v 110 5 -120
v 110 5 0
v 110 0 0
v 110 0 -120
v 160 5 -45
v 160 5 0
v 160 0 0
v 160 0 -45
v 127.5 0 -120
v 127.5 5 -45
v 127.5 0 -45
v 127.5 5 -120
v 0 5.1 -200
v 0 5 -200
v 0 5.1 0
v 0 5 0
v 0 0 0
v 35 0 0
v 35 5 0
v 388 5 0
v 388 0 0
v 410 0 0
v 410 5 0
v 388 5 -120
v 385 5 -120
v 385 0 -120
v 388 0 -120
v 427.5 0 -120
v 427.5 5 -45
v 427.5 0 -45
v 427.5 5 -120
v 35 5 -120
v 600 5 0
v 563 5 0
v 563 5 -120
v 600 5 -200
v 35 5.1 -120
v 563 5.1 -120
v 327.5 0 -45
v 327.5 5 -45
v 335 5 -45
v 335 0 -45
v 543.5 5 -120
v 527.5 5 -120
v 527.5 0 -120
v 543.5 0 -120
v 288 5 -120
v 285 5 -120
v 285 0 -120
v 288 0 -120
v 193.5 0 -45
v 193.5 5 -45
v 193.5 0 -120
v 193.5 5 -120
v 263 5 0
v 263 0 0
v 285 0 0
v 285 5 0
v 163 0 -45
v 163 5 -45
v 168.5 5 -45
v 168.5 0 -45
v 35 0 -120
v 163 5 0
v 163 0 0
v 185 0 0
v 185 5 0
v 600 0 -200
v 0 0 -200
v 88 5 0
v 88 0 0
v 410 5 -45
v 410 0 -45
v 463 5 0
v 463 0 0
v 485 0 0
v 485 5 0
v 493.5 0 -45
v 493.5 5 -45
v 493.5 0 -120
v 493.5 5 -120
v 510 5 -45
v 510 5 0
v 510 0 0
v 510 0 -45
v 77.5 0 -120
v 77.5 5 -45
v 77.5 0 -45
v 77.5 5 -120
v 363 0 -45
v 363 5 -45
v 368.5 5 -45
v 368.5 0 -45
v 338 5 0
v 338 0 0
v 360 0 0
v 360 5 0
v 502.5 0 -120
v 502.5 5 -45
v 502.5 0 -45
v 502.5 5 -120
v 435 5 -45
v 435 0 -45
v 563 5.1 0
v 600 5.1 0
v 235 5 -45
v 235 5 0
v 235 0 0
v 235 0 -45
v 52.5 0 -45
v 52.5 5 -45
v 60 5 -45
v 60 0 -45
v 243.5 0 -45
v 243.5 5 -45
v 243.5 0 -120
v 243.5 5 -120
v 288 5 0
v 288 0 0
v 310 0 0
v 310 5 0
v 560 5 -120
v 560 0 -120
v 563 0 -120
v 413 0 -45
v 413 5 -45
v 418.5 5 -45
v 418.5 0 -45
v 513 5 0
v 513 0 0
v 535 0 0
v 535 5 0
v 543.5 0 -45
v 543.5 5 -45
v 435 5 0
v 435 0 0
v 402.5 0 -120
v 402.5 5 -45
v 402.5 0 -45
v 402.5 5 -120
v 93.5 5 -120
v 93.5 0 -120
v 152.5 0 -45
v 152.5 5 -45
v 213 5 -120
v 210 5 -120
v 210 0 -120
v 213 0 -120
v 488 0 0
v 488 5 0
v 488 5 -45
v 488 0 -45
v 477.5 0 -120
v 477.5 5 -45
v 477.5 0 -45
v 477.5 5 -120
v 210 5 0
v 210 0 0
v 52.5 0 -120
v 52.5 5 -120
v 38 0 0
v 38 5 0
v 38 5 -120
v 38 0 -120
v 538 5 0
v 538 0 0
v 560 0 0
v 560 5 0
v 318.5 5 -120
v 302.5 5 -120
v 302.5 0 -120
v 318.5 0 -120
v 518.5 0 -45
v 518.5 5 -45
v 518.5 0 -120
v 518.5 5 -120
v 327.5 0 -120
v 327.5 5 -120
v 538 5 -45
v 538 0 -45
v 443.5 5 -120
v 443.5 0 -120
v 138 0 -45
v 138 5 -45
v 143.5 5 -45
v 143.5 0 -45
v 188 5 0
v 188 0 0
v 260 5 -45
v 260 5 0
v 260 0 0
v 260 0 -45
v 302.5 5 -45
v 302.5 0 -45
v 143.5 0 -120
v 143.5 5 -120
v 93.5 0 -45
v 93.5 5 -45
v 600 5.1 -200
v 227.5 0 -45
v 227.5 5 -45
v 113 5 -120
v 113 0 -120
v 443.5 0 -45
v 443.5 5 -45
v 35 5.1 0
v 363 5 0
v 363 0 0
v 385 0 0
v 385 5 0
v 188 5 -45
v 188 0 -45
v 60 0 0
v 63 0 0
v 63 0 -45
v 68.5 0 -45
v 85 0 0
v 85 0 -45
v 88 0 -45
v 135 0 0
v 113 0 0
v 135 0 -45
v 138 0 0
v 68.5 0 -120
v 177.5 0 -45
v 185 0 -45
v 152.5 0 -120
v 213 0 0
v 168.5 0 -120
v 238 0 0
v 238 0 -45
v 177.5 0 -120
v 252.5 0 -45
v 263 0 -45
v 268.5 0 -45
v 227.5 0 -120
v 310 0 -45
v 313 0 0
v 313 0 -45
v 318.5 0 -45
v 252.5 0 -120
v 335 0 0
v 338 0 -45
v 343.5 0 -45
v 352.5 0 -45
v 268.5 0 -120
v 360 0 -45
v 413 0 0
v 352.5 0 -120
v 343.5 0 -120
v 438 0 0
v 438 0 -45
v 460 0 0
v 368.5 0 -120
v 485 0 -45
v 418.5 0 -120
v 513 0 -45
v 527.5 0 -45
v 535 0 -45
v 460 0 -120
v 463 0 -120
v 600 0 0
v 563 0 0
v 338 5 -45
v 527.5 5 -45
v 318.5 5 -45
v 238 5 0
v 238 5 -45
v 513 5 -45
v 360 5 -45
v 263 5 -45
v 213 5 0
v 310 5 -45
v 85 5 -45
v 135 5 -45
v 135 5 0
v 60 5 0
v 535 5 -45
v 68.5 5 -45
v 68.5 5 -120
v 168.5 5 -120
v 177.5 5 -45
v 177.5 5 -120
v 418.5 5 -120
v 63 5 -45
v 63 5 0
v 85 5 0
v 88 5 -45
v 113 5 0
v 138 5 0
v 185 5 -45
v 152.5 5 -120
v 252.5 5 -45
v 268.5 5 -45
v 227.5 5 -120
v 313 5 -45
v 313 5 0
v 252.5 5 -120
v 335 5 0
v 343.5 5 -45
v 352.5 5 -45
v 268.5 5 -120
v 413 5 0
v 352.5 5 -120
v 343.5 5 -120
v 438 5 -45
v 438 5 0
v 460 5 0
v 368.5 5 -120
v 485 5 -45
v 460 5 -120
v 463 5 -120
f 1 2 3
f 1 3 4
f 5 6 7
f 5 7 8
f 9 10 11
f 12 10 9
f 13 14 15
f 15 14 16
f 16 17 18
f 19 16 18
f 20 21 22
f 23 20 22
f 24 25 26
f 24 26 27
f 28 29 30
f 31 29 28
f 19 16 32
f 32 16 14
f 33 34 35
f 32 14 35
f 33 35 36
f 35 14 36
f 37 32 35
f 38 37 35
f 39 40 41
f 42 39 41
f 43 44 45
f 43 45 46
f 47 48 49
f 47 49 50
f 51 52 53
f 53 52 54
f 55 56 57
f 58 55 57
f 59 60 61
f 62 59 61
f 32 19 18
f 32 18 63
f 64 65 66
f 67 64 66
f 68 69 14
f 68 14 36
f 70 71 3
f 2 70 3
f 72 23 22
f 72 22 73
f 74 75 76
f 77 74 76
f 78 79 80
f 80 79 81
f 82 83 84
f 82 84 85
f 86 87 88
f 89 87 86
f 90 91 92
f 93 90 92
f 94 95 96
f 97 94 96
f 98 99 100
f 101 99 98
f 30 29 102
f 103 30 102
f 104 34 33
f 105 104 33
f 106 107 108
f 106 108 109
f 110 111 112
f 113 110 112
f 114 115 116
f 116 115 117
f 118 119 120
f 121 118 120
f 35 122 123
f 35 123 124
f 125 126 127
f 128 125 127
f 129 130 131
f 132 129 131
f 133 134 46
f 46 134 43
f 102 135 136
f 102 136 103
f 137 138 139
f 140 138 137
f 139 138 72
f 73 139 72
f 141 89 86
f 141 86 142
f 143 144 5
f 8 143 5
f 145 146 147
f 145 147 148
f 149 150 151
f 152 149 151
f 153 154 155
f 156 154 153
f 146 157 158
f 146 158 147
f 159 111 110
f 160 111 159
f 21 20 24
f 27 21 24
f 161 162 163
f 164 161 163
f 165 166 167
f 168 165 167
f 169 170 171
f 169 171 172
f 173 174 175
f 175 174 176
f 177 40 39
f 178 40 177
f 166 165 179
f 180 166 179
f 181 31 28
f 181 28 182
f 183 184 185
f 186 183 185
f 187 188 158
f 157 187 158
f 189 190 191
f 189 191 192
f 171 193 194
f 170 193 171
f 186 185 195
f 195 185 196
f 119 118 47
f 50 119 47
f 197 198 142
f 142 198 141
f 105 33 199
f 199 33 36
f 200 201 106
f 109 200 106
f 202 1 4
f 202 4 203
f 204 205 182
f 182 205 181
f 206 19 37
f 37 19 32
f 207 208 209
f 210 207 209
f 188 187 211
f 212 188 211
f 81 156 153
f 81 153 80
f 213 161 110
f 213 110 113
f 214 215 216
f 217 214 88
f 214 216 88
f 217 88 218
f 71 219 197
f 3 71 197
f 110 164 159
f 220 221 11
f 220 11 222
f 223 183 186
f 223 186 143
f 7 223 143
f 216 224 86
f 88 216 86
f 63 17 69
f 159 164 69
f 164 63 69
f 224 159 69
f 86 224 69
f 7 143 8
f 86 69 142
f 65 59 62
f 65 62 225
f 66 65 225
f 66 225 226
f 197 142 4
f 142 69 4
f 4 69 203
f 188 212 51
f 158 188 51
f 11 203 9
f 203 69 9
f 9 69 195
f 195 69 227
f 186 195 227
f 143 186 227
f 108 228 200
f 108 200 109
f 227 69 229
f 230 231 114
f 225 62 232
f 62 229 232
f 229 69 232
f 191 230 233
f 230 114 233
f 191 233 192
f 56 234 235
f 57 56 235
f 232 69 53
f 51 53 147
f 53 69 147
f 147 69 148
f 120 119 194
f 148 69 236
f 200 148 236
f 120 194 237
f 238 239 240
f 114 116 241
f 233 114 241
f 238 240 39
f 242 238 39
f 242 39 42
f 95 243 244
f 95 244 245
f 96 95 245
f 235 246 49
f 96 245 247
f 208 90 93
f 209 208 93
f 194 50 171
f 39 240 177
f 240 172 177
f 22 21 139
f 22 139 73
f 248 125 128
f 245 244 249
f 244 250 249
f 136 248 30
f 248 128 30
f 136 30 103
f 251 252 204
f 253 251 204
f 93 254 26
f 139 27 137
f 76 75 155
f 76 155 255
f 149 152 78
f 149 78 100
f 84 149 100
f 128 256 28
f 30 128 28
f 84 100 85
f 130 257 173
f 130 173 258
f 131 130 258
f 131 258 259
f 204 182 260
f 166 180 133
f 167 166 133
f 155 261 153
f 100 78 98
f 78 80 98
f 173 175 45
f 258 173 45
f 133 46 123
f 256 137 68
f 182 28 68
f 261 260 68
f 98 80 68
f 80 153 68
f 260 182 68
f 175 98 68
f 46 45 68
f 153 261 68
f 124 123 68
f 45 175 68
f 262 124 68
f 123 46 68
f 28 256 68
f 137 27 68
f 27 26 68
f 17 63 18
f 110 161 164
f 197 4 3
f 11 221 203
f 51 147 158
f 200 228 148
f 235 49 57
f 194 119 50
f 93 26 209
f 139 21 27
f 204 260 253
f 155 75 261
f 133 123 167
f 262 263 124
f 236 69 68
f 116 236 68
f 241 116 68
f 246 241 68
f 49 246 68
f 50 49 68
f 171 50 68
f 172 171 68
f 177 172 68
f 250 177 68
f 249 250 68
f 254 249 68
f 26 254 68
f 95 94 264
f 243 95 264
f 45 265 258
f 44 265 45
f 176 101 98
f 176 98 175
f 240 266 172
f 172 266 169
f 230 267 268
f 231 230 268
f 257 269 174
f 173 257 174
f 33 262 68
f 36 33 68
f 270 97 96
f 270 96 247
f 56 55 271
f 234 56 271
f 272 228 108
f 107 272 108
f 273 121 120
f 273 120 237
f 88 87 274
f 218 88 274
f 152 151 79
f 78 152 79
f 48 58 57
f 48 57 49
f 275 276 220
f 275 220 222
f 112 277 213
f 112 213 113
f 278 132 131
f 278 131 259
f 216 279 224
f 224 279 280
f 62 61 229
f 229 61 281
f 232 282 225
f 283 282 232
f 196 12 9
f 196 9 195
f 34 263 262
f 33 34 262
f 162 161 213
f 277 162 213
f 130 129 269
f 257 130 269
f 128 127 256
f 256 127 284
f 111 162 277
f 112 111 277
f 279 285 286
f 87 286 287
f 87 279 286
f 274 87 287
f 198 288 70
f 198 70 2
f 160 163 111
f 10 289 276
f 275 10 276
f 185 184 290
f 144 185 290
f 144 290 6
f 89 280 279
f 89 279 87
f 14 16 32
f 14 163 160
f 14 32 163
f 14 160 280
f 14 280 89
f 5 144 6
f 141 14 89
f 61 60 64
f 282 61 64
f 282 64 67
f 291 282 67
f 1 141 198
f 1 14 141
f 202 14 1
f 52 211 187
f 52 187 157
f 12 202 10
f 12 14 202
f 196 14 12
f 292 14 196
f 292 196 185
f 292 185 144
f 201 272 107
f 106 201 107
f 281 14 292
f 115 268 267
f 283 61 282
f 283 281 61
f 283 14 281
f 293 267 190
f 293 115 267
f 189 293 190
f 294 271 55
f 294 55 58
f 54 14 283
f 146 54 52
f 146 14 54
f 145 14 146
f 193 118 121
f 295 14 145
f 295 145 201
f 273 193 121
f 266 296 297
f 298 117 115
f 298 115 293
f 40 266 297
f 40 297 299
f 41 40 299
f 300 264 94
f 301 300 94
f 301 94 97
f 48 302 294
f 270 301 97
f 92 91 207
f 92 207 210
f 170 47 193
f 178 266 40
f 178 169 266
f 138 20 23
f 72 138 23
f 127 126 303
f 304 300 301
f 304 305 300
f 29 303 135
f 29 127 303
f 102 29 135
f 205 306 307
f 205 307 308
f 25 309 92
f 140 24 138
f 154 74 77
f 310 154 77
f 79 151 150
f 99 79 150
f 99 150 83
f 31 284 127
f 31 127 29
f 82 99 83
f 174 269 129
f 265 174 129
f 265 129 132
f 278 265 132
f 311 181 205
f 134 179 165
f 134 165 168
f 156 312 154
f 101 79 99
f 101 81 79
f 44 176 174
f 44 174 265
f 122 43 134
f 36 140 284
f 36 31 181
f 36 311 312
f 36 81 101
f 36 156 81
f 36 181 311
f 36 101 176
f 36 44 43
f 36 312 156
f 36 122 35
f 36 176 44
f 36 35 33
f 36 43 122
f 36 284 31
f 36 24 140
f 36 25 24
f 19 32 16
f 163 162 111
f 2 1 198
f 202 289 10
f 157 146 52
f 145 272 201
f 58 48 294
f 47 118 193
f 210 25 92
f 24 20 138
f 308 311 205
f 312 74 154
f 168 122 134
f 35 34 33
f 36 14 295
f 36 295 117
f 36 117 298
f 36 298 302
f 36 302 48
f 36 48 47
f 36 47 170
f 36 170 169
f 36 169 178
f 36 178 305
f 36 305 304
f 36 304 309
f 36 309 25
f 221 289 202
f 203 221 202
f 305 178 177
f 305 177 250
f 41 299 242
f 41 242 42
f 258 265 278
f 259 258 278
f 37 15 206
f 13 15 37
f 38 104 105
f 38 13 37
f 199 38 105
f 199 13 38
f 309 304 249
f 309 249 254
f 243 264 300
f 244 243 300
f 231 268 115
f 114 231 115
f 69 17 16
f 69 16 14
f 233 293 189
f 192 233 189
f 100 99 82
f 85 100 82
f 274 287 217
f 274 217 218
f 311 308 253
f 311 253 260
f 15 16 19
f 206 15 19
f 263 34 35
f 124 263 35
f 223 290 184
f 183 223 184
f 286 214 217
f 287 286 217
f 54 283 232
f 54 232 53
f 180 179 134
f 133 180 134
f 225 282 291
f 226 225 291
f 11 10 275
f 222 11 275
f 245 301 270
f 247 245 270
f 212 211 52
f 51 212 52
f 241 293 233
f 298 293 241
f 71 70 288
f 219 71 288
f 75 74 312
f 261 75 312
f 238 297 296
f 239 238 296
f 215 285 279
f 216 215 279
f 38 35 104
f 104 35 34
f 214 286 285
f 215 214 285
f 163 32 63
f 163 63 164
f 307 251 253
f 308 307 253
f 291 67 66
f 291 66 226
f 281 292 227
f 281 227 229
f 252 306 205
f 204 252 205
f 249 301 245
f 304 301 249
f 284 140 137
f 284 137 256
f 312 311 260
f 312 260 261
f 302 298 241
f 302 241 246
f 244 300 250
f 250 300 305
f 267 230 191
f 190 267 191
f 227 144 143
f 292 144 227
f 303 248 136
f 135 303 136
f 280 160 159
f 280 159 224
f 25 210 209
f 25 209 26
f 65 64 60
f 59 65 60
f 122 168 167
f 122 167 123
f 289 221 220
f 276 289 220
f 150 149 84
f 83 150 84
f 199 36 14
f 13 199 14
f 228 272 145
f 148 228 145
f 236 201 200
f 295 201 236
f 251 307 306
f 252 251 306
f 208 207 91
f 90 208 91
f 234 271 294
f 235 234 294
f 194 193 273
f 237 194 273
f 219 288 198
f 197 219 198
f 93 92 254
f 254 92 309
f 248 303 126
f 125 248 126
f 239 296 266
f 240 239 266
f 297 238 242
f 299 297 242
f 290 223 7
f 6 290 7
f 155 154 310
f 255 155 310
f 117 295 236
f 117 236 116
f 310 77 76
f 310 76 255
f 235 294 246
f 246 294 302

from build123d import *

# Parameters (mm, degrees)
SKETCH1_W           = 600
SKETCH1_H           = 200
BOSS_EXTRUDE1_DEPTH = 5
SKETCH2_W           = 3
SKETCH2_H           = 120
CUT_EXTRUDE4_DEPTH  = 5
SKETCH4_W           = 16
SKETCH4_H           = 75
CUT_EXTRUDE5_DEPTH  = 5
BOSS_EXTRUDE2_DEPTH = 0.1


with BuildPart() as part:
    # Sketch1 → Boss-Extrude1 (new body)
    with BuildSketch(Plane(origin=(0, 0, 0), x_dir=(1, 0, 0), z_dir=(0, 1, 0))):
        with Locations((300, 100)):
            Rectangle(SKETCH1_W, SKETCH1_H)
    extrude(amount=BOSS_EXTRUDE1_DEPTH)

    # Sketch2 → Cut-Extrude4 (cut)
    with BuildSketch(Plane(origin=(0, 5, 0), x_dir=(1, 0, 0), z_dir=(0, 1, 0))):
        with Locations((36.5, 60)):
            Rectangle(SKETCH2_W, SKETCH2_H)
        with Locations((61.5, 60)):
            Rectangle(SKETCH2_W, SKETCH2_H)
        with Locations((86.5, 60)):
            Rectangle(SKETCH2_W, SKETCH2_H)
        with Locations((111.5, 60)):
            Rectangle(SKETCH2_W, SKETCH2_H)
        with Locations((136.5, 60)):
            Rectangle(SKETCH2_W, SKETCH2_H)
        with Locations((161.5, 60)):
            Rectangle(SKETCH2_W, SKETCH2_H)
        with Locations((186.5, 60)):
            Rectangle(SKETCH2_W, SKETCH2_H)
        with Locations((211.5, 60)):
            Rectangle(SKETCH2_W, SKETCH2_H)
        with Locations((236.5, 60)):
            Rectangle(SKETCH2_W, SKETCH2_H)
        with Locations((261.5, 60)):
            Rectangle(SKETCH2_W, SKETCH2_H)
        with Locations((286.5, 60)):
            Rectangle(SKETCH2_W, SKETCH2_H)
        with Locations((311.5, 60)):
            Rectangle(SKETCH2_W, SKETCH2_H)
        with Locations((336.5, 60)):
            Rectangle(SKETCH2_W, SKETCH2_H)
        with Locations((361.5, 60)):
            Rectangle(SKETCH2_W, SKETCH2_H)
        with Locations((386.5, 60)):
            Rectangle(SKETCH2_W, SKETCH2_H)
        with Locations((411.5, 60)):
            Rectangle(SKETCH2_W, SKETCH2_H)
        with Locations((436.5, 60)):
            Rectangle(SKETCH2_W, SKETCH2_H)
        with Locations((461.5, 60)):
            Rectangle(SKETCH2_W, SKETCH2_H)
        with Locations((486.5, 60)):
            Rectangle(SKETCH2_W, SKETCH2_H)
        with Locations((511.5, 60)):
            Rectangle(SKETCH2_W, SKETCH2_H)
        with Locations((536.5, 60)):
            Rectangle(SKETCH2_W, SKETCH2_H)
        with Locations((561.5, 60)):
            Rectangle(SKETCH2_W, SKETCH2_H)
    extrude(amount=-CUT_EXTRUDE4_DEPTH, mode=Mode.SUBTRACT)

    # Sketch4 → Cut-Extrude5 (cut)
    with BuildSketch(Plane(origin=(0, 5, 0), x_dir=(1, 0, 0), z_dir=(0, 1, 0))):
        with Locations((60.5, 82.5)):
            Rectangle(SKETCH4_W, SKETCH4_H)
        with Locations((85.5, 82.5)):
            Rectangle(SKETCH4_W, SKETCH4_H)
        with Locations((135.5, 82.5)):
            Rectangle(SKETCH4_W, SKETCH4_H)
        with Locations((160.5, 82.5)):
            Rectangle(SKETCH4_W, SKETCH4_H)
        with Locations((185.5, 82.5)):
            Rectangle(SKETCH4_W, SKETCH4_H)
        with Locations((235.5, 82.5)):
            Rectangle(SKETCH4_W, SKETCH4_H)
        with Locations((260.5, 82.5)):
            Rectangle(SKETCH4_W, SKETCH4_H)
        with Locations((310.5, 82.5)):
            Rectangle(SKETCH4_W, SKETCH4_H)
        with Locations((335.5, 82.5)):
            Rectangle(SKETCH4_W, SKETCH4_H)
        with Locations((360.5, 82.5)):
            Rectangle(SKETCH4_W, SKETCH4_H)
        with Locations((410.5, 82.5)):
            Rectangle(SKETCH4_W, SKETCH4_H)
        with Locations((435.5, 82.5)):
            Rectangle(SKETCH4_W, SKETCH4_H)
        with Locations((485.5, 82.5)):
            Rectangle(SKETCH4_W, SKETCH4_H)
        with Locations((510.5, 82.5)):
            Rectangle(SKETCH4_W, SKETCH4_H)
        with Locations((535.5, 82.5)):
            Rectangle(SKETCH4_W, SKETCH4_H)
    extrude(amount=-CUT_EXTRUDE5_DEPTH, mode=Mode.SUBTRACT)


with BuildPart() as body_2:
    # Sketch5 → Boss-Extrude2 (new body)
    with BuildSketch(Plane(origin=(0, 5, 0), x_dir=(1, 0, 0), z_dir=(0, 1, 0))):
        Polygon((0, 0), (35, 0), (35, 120), (563, 120), (563, 0), (600, 0), (600, 120), (600, 200), (0, 200), (0, 120), align=None)
    extrude(amount=BOSS_EXTRUDE2_DEPTH)


solid = Compound([part.part, body_2.part])
